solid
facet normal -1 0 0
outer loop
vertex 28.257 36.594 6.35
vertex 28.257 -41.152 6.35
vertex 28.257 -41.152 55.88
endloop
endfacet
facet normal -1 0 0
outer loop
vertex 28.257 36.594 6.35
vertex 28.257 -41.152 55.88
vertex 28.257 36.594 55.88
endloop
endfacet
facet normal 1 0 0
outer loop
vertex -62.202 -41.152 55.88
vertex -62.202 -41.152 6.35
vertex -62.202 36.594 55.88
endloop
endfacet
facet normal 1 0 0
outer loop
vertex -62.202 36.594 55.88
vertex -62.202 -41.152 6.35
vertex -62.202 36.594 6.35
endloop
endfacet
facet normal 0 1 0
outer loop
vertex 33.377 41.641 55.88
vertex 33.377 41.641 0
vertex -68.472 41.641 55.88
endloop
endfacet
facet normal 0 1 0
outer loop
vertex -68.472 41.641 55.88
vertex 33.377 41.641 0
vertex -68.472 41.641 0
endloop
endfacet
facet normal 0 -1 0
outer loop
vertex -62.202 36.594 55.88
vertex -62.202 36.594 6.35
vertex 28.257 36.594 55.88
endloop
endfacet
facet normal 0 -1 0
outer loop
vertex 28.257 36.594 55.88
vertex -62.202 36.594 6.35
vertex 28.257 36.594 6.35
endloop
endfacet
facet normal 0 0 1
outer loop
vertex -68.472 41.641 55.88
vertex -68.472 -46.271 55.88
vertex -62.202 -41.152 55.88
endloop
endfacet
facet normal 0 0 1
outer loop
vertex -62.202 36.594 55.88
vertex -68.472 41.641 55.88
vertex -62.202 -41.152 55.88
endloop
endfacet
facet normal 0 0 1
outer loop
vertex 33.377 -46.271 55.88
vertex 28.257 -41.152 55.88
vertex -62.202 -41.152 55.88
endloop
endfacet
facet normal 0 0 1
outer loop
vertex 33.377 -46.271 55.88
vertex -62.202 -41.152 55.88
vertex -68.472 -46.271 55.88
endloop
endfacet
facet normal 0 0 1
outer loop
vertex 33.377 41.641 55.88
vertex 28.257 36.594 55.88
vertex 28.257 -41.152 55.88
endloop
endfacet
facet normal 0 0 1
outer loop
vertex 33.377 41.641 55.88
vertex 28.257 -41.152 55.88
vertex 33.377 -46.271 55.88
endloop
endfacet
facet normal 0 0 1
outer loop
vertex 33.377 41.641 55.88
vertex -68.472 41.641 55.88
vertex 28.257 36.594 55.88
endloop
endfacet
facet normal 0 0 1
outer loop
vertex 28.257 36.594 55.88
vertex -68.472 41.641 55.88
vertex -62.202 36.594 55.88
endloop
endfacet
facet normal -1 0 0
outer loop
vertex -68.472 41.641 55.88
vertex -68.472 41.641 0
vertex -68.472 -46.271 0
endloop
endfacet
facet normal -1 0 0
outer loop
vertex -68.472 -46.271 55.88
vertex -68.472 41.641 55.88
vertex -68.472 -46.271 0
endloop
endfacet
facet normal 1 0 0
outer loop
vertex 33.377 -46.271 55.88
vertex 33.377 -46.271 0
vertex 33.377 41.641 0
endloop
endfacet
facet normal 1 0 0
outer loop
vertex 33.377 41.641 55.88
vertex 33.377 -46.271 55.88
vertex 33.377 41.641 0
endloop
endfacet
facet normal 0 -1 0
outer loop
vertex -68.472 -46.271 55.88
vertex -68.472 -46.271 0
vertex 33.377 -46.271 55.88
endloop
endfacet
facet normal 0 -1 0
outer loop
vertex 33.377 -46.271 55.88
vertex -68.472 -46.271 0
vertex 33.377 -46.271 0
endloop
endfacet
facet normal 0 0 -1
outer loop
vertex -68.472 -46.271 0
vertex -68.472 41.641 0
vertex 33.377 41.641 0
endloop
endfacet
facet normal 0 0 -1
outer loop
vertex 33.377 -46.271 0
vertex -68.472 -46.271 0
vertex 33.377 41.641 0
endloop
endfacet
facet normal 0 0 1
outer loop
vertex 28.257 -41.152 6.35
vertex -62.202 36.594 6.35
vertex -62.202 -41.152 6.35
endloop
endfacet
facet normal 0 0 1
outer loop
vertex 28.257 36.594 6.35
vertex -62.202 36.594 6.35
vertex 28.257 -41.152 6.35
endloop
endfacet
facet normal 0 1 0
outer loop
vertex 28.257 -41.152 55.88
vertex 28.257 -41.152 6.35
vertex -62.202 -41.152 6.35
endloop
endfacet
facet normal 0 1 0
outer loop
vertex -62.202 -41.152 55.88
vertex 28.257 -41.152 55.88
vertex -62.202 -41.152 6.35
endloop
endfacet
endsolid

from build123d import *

# Parameters (mm, degrees)
F0_W     = 90.4587376863
F0_H     = 77.7452811599
F1_DEPTH = 6.35
F0_W_2   = 5.1199775189
F2_DEPTH = 55.88


with BuildPart() as f1:
    # F0 (on Top) → F1 (new body)
    with BuildSketch(Plane.XY):
        with Locations((-16.9725483283, -2.2788867354)):
            Rectangle(F0_W, F0_H)
    extrude(amount=F1_DEPTH)

    # F0 (on Top) → F2 (join)
    with BuildSketch(Plane.XY):
        Polygon((-62.2019171715, 41.6413508356), (-62.2019171715, 36.5937538445), (28.2568205148, 36.5937538445), (33.3767980337, 36.5937538445), (33.3767980337, 41.6413508356), align=None)
        Polygon((-62.2019171715, -41.1515273154), (-62.2019171715, 36.5937538445), (-62.2019171715, 41.6413508356), (-68.4723928571, 41.6413508356), (-68.4723928571, -46.2711900473), (-62.2019171715, -46.2711900473), align=None)
        with Locations((30.8168092743, -2.2788867354)):
            Rectangle(F0_W_2, F0_H)
        Polygon((28.2568205148, -41.1515273154), (-62.2019171715, -41.1515273154), (-62.2019171715, -46.2711900473), (33.3767980337, -46.2711900473), (33.3767980337, -41.1515273154), align=None)
    extrude(amount=F2_DEPTH)


solid = f1.part
